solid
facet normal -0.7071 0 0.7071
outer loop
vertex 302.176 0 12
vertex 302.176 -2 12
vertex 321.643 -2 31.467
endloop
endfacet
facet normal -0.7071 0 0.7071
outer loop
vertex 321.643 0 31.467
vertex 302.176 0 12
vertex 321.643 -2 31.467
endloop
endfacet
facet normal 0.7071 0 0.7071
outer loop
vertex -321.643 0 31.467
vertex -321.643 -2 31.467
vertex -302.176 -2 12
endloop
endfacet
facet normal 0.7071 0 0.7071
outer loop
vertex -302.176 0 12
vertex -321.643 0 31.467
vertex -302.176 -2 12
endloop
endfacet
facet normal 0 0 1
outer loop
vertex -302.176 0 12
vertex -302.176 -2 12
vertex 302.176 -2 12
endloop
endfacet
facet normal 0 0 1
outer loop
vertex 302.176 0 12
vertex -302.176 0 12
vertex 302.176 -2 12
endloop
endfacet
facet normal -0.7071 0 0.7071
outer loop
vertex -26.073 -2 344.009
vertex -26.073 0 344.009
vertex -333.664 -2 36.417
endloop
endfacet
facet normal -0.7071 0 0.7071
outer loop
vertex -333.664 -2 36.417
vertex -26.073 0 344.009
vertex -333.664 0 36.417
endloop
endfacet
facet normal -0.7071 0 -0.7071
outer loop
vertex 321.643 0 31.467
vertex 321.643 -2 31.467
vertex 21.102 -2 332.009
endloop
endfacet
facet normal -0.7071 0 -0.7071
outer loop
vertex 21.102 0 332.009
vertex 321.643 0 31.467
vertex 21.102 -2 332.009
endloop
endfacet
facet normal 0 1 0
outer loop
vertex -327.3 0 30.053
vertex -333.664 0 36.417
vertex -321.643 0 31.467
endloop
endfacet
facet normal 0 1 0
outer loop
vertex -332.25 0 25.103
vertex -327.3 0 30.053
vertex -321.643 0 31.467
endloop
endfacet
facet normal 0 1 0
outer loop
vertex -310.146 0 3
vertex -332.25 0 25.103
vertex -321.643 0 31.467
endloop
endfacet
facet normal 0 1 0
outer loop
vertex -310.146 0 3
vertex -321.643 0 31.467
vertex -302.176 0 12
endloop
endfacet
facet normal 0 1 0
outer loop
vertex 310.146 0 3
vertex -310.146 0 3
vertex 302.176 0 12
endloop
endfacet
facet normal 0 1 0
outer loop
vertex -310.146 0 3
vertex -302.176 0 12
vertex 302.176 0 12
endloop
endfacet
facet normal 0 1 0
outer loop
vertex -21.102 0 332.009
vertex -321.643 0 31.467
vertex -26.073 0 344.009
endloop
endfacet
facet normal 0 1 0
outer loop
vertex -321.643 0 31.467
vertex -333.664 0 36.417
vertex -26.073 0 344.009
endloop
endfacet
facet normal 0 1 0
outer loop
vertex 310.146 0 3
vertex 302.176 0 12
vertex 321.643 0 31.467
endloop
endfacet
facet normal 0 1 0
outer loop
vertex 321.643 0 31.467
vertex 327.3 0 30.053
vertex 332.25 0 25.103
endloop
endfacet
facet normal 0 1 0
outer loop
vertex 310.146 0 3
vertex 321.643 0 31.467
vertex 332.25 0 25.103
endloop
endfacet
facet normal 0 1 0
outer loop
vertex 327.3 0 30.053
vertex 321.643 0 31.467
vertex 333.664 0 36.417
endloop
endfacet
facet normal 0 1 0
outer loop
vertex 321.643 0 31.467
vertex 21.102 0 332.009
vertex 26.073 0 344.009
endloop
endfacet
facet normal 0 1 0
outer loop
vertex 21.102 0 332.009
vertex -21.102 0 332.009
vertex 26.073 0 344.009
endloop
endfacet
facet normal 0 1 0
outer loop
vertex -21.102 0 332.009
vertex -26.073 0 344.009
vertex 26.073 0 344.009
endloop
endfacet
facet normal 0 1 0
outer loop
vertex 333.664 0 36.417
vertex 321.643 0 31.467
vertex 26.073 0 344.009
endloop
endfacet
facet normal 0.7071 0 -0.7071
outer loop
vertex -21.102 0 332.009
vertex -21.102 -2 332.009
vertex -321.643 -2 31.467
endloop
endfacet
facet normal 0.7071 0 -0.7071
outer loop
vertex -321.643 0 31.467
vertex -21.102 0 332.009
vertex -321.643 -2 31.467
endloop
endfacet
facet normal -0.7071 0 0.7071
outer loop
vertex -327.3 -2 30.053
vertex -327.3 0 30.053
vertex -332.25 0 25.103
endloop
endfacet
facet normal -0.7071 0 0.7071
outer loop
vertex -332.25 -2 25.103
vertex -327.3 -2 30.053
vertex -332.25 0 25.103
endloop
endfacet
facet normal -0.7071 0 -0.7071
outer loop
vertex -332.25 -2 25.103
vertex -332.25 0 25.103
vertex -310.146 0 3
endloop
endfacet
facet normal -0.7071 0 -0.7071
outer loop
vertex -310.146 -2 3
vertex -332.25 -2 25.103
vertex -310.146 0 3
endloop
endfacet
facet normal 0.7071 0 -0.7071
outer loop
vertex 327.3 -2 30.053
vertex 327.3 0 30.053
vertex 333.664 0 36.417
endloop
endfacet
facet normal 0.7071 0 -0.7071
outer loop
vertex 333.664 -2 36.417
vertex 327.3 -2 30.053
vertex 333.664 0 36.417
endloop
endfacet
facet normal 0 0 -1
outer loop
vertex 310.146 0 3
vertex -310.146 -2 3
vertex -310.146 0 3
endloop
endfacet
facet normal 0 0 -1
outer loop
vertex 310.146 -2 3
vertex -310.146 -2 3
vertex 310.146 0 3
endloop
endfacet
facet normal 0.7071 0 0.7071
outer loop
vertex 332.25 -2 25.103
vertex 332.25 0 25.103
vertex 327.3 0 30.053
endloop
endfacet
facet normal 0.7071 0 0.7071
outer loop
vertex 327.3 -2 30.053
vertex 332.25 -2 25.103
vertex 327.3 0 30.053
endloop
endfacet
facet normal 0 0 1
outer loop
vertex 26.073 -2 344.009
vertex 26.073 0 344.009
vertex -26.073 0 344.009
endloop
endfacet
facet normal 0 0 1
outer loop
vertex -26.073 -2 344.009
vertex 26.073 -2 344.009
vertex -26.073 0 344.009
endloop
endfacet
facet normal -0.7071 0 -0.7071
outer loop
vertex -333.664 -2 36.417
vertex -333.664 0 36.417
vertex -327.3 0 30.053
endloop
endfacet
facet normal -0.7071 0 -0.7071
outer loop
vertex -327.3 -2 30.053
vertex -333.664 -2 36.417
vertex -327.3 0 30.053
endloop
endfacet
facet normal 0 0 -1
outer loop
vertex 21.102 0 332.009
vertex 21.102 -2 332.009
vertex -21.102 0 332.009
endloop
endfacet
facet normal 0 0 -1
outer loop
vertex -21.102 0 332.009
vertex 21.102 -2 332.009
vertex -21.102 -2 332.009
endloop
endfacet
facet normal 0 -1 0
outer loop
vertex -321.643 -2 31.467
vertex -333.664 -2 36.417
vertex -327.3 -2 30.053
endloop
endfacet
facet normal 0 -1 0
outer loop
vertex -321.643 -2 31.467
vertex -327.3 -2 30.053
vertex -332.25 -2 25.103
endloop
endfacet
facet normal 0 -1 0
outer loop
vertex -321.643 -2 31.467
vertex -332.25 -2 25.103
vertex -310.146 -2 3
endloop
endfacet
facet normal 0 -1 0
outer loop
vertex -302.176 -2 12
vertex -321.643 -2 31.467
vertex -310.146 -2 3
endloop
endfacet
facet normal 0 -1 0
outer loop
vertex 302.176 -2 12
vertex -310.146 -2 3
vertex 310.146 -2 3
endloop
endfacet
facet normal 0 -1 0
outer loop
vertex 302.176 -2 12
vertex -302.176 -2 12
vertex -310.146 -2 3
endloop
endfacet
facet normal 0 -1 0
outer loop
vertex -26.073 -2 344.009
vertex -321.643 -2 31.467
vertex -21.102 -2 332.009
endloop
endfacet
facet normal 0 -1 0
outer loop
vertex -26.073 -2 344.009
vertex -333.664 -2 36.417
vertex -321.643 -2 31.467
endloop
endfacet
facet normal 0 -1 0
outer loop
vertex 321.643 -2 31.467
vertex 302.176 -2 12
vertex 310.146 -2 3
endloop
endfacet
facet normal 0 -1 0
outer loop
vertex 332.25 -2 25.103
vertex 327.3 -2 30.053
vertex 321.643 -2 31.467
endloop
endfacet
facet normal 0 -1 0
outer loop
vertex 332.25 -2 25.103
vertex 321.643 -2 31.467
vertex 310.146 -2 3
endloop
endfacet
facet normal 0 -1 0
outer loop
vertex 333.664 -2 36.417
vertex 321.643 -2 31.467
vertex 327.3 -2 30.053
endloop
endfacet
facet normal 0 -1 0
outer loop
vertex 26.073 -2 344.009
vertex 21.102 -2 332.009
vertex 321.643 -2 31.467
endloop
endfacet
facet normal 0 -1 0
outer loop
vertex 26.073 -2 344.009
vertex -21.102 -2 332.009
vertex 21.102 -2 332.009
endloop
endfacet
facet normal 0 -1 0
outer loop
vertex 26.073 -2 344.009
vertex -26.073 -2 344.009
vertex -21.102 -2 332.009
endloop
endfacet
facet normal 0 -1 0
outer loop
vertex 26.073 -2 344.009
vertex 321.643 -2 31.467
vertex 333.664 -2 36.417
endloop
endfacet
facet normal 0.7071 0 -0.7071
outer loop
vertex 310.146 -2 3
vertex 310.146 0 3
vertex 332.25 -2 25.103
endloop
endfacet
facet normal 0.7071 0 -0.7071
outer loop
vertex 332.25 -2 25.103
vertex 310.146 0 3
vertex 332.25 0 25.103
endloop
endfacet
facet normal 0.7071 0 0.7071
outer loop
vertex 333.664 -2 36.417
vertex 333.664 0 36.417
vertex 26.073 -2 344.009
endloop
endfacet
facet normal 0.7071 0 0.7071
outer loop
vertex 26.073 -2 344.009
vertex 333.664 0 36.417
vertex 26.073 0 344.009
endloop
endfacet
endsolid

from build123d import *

# Parameters (mm, degrees)
F1_DEPTH = 2
F3_DEPTH = 2
F4_W     = 650
F4_H     = 6
F5_DEPTH = 2


with BuildPart() as f1:
    # F0 (on Front) → F1 (new body)
    with BuildSketch(Plane.XZ):
        Polygon((327.300058, 30.053136), (333.664019, 36.417097), (26.07257, 344.008547), (0, 344.008547), (-26.07257, 344.008547), (-333.664019, 36.417097), (-327.300058, 30.053136), (-332.249806, 25.103389), (-307.146417, 0), (0, 0), (307.146417, 0), (332.249806, 25.103389), align=None)
    extrude(amount=F1_DEPTH)

    # F2 (on face) → F3 (cut)
    with BuildSketch(Plane.XZ.offset(2)):
        Polygon((321.643204, 31.46735), (21.102007, 332.008547), (0, 332.008547), (-21.102007, 332.008547), (-321.643204, 31.46735), (-302.175854, 12), (0, 12), (302.175854, 12), align=None)
    extrude(amount=-F3_DEPTH, mode=Mode.SUBTRACT)

    # F4 (on face) → F5 (cut)
    with BuildSketch(Plane.XZ.offset(2)):
        Rectangle(F4_W, F4_H)
    extrude(amount=-F5_DEPTH, mode=Mode.SUBTRACT)


solid = f1.part
